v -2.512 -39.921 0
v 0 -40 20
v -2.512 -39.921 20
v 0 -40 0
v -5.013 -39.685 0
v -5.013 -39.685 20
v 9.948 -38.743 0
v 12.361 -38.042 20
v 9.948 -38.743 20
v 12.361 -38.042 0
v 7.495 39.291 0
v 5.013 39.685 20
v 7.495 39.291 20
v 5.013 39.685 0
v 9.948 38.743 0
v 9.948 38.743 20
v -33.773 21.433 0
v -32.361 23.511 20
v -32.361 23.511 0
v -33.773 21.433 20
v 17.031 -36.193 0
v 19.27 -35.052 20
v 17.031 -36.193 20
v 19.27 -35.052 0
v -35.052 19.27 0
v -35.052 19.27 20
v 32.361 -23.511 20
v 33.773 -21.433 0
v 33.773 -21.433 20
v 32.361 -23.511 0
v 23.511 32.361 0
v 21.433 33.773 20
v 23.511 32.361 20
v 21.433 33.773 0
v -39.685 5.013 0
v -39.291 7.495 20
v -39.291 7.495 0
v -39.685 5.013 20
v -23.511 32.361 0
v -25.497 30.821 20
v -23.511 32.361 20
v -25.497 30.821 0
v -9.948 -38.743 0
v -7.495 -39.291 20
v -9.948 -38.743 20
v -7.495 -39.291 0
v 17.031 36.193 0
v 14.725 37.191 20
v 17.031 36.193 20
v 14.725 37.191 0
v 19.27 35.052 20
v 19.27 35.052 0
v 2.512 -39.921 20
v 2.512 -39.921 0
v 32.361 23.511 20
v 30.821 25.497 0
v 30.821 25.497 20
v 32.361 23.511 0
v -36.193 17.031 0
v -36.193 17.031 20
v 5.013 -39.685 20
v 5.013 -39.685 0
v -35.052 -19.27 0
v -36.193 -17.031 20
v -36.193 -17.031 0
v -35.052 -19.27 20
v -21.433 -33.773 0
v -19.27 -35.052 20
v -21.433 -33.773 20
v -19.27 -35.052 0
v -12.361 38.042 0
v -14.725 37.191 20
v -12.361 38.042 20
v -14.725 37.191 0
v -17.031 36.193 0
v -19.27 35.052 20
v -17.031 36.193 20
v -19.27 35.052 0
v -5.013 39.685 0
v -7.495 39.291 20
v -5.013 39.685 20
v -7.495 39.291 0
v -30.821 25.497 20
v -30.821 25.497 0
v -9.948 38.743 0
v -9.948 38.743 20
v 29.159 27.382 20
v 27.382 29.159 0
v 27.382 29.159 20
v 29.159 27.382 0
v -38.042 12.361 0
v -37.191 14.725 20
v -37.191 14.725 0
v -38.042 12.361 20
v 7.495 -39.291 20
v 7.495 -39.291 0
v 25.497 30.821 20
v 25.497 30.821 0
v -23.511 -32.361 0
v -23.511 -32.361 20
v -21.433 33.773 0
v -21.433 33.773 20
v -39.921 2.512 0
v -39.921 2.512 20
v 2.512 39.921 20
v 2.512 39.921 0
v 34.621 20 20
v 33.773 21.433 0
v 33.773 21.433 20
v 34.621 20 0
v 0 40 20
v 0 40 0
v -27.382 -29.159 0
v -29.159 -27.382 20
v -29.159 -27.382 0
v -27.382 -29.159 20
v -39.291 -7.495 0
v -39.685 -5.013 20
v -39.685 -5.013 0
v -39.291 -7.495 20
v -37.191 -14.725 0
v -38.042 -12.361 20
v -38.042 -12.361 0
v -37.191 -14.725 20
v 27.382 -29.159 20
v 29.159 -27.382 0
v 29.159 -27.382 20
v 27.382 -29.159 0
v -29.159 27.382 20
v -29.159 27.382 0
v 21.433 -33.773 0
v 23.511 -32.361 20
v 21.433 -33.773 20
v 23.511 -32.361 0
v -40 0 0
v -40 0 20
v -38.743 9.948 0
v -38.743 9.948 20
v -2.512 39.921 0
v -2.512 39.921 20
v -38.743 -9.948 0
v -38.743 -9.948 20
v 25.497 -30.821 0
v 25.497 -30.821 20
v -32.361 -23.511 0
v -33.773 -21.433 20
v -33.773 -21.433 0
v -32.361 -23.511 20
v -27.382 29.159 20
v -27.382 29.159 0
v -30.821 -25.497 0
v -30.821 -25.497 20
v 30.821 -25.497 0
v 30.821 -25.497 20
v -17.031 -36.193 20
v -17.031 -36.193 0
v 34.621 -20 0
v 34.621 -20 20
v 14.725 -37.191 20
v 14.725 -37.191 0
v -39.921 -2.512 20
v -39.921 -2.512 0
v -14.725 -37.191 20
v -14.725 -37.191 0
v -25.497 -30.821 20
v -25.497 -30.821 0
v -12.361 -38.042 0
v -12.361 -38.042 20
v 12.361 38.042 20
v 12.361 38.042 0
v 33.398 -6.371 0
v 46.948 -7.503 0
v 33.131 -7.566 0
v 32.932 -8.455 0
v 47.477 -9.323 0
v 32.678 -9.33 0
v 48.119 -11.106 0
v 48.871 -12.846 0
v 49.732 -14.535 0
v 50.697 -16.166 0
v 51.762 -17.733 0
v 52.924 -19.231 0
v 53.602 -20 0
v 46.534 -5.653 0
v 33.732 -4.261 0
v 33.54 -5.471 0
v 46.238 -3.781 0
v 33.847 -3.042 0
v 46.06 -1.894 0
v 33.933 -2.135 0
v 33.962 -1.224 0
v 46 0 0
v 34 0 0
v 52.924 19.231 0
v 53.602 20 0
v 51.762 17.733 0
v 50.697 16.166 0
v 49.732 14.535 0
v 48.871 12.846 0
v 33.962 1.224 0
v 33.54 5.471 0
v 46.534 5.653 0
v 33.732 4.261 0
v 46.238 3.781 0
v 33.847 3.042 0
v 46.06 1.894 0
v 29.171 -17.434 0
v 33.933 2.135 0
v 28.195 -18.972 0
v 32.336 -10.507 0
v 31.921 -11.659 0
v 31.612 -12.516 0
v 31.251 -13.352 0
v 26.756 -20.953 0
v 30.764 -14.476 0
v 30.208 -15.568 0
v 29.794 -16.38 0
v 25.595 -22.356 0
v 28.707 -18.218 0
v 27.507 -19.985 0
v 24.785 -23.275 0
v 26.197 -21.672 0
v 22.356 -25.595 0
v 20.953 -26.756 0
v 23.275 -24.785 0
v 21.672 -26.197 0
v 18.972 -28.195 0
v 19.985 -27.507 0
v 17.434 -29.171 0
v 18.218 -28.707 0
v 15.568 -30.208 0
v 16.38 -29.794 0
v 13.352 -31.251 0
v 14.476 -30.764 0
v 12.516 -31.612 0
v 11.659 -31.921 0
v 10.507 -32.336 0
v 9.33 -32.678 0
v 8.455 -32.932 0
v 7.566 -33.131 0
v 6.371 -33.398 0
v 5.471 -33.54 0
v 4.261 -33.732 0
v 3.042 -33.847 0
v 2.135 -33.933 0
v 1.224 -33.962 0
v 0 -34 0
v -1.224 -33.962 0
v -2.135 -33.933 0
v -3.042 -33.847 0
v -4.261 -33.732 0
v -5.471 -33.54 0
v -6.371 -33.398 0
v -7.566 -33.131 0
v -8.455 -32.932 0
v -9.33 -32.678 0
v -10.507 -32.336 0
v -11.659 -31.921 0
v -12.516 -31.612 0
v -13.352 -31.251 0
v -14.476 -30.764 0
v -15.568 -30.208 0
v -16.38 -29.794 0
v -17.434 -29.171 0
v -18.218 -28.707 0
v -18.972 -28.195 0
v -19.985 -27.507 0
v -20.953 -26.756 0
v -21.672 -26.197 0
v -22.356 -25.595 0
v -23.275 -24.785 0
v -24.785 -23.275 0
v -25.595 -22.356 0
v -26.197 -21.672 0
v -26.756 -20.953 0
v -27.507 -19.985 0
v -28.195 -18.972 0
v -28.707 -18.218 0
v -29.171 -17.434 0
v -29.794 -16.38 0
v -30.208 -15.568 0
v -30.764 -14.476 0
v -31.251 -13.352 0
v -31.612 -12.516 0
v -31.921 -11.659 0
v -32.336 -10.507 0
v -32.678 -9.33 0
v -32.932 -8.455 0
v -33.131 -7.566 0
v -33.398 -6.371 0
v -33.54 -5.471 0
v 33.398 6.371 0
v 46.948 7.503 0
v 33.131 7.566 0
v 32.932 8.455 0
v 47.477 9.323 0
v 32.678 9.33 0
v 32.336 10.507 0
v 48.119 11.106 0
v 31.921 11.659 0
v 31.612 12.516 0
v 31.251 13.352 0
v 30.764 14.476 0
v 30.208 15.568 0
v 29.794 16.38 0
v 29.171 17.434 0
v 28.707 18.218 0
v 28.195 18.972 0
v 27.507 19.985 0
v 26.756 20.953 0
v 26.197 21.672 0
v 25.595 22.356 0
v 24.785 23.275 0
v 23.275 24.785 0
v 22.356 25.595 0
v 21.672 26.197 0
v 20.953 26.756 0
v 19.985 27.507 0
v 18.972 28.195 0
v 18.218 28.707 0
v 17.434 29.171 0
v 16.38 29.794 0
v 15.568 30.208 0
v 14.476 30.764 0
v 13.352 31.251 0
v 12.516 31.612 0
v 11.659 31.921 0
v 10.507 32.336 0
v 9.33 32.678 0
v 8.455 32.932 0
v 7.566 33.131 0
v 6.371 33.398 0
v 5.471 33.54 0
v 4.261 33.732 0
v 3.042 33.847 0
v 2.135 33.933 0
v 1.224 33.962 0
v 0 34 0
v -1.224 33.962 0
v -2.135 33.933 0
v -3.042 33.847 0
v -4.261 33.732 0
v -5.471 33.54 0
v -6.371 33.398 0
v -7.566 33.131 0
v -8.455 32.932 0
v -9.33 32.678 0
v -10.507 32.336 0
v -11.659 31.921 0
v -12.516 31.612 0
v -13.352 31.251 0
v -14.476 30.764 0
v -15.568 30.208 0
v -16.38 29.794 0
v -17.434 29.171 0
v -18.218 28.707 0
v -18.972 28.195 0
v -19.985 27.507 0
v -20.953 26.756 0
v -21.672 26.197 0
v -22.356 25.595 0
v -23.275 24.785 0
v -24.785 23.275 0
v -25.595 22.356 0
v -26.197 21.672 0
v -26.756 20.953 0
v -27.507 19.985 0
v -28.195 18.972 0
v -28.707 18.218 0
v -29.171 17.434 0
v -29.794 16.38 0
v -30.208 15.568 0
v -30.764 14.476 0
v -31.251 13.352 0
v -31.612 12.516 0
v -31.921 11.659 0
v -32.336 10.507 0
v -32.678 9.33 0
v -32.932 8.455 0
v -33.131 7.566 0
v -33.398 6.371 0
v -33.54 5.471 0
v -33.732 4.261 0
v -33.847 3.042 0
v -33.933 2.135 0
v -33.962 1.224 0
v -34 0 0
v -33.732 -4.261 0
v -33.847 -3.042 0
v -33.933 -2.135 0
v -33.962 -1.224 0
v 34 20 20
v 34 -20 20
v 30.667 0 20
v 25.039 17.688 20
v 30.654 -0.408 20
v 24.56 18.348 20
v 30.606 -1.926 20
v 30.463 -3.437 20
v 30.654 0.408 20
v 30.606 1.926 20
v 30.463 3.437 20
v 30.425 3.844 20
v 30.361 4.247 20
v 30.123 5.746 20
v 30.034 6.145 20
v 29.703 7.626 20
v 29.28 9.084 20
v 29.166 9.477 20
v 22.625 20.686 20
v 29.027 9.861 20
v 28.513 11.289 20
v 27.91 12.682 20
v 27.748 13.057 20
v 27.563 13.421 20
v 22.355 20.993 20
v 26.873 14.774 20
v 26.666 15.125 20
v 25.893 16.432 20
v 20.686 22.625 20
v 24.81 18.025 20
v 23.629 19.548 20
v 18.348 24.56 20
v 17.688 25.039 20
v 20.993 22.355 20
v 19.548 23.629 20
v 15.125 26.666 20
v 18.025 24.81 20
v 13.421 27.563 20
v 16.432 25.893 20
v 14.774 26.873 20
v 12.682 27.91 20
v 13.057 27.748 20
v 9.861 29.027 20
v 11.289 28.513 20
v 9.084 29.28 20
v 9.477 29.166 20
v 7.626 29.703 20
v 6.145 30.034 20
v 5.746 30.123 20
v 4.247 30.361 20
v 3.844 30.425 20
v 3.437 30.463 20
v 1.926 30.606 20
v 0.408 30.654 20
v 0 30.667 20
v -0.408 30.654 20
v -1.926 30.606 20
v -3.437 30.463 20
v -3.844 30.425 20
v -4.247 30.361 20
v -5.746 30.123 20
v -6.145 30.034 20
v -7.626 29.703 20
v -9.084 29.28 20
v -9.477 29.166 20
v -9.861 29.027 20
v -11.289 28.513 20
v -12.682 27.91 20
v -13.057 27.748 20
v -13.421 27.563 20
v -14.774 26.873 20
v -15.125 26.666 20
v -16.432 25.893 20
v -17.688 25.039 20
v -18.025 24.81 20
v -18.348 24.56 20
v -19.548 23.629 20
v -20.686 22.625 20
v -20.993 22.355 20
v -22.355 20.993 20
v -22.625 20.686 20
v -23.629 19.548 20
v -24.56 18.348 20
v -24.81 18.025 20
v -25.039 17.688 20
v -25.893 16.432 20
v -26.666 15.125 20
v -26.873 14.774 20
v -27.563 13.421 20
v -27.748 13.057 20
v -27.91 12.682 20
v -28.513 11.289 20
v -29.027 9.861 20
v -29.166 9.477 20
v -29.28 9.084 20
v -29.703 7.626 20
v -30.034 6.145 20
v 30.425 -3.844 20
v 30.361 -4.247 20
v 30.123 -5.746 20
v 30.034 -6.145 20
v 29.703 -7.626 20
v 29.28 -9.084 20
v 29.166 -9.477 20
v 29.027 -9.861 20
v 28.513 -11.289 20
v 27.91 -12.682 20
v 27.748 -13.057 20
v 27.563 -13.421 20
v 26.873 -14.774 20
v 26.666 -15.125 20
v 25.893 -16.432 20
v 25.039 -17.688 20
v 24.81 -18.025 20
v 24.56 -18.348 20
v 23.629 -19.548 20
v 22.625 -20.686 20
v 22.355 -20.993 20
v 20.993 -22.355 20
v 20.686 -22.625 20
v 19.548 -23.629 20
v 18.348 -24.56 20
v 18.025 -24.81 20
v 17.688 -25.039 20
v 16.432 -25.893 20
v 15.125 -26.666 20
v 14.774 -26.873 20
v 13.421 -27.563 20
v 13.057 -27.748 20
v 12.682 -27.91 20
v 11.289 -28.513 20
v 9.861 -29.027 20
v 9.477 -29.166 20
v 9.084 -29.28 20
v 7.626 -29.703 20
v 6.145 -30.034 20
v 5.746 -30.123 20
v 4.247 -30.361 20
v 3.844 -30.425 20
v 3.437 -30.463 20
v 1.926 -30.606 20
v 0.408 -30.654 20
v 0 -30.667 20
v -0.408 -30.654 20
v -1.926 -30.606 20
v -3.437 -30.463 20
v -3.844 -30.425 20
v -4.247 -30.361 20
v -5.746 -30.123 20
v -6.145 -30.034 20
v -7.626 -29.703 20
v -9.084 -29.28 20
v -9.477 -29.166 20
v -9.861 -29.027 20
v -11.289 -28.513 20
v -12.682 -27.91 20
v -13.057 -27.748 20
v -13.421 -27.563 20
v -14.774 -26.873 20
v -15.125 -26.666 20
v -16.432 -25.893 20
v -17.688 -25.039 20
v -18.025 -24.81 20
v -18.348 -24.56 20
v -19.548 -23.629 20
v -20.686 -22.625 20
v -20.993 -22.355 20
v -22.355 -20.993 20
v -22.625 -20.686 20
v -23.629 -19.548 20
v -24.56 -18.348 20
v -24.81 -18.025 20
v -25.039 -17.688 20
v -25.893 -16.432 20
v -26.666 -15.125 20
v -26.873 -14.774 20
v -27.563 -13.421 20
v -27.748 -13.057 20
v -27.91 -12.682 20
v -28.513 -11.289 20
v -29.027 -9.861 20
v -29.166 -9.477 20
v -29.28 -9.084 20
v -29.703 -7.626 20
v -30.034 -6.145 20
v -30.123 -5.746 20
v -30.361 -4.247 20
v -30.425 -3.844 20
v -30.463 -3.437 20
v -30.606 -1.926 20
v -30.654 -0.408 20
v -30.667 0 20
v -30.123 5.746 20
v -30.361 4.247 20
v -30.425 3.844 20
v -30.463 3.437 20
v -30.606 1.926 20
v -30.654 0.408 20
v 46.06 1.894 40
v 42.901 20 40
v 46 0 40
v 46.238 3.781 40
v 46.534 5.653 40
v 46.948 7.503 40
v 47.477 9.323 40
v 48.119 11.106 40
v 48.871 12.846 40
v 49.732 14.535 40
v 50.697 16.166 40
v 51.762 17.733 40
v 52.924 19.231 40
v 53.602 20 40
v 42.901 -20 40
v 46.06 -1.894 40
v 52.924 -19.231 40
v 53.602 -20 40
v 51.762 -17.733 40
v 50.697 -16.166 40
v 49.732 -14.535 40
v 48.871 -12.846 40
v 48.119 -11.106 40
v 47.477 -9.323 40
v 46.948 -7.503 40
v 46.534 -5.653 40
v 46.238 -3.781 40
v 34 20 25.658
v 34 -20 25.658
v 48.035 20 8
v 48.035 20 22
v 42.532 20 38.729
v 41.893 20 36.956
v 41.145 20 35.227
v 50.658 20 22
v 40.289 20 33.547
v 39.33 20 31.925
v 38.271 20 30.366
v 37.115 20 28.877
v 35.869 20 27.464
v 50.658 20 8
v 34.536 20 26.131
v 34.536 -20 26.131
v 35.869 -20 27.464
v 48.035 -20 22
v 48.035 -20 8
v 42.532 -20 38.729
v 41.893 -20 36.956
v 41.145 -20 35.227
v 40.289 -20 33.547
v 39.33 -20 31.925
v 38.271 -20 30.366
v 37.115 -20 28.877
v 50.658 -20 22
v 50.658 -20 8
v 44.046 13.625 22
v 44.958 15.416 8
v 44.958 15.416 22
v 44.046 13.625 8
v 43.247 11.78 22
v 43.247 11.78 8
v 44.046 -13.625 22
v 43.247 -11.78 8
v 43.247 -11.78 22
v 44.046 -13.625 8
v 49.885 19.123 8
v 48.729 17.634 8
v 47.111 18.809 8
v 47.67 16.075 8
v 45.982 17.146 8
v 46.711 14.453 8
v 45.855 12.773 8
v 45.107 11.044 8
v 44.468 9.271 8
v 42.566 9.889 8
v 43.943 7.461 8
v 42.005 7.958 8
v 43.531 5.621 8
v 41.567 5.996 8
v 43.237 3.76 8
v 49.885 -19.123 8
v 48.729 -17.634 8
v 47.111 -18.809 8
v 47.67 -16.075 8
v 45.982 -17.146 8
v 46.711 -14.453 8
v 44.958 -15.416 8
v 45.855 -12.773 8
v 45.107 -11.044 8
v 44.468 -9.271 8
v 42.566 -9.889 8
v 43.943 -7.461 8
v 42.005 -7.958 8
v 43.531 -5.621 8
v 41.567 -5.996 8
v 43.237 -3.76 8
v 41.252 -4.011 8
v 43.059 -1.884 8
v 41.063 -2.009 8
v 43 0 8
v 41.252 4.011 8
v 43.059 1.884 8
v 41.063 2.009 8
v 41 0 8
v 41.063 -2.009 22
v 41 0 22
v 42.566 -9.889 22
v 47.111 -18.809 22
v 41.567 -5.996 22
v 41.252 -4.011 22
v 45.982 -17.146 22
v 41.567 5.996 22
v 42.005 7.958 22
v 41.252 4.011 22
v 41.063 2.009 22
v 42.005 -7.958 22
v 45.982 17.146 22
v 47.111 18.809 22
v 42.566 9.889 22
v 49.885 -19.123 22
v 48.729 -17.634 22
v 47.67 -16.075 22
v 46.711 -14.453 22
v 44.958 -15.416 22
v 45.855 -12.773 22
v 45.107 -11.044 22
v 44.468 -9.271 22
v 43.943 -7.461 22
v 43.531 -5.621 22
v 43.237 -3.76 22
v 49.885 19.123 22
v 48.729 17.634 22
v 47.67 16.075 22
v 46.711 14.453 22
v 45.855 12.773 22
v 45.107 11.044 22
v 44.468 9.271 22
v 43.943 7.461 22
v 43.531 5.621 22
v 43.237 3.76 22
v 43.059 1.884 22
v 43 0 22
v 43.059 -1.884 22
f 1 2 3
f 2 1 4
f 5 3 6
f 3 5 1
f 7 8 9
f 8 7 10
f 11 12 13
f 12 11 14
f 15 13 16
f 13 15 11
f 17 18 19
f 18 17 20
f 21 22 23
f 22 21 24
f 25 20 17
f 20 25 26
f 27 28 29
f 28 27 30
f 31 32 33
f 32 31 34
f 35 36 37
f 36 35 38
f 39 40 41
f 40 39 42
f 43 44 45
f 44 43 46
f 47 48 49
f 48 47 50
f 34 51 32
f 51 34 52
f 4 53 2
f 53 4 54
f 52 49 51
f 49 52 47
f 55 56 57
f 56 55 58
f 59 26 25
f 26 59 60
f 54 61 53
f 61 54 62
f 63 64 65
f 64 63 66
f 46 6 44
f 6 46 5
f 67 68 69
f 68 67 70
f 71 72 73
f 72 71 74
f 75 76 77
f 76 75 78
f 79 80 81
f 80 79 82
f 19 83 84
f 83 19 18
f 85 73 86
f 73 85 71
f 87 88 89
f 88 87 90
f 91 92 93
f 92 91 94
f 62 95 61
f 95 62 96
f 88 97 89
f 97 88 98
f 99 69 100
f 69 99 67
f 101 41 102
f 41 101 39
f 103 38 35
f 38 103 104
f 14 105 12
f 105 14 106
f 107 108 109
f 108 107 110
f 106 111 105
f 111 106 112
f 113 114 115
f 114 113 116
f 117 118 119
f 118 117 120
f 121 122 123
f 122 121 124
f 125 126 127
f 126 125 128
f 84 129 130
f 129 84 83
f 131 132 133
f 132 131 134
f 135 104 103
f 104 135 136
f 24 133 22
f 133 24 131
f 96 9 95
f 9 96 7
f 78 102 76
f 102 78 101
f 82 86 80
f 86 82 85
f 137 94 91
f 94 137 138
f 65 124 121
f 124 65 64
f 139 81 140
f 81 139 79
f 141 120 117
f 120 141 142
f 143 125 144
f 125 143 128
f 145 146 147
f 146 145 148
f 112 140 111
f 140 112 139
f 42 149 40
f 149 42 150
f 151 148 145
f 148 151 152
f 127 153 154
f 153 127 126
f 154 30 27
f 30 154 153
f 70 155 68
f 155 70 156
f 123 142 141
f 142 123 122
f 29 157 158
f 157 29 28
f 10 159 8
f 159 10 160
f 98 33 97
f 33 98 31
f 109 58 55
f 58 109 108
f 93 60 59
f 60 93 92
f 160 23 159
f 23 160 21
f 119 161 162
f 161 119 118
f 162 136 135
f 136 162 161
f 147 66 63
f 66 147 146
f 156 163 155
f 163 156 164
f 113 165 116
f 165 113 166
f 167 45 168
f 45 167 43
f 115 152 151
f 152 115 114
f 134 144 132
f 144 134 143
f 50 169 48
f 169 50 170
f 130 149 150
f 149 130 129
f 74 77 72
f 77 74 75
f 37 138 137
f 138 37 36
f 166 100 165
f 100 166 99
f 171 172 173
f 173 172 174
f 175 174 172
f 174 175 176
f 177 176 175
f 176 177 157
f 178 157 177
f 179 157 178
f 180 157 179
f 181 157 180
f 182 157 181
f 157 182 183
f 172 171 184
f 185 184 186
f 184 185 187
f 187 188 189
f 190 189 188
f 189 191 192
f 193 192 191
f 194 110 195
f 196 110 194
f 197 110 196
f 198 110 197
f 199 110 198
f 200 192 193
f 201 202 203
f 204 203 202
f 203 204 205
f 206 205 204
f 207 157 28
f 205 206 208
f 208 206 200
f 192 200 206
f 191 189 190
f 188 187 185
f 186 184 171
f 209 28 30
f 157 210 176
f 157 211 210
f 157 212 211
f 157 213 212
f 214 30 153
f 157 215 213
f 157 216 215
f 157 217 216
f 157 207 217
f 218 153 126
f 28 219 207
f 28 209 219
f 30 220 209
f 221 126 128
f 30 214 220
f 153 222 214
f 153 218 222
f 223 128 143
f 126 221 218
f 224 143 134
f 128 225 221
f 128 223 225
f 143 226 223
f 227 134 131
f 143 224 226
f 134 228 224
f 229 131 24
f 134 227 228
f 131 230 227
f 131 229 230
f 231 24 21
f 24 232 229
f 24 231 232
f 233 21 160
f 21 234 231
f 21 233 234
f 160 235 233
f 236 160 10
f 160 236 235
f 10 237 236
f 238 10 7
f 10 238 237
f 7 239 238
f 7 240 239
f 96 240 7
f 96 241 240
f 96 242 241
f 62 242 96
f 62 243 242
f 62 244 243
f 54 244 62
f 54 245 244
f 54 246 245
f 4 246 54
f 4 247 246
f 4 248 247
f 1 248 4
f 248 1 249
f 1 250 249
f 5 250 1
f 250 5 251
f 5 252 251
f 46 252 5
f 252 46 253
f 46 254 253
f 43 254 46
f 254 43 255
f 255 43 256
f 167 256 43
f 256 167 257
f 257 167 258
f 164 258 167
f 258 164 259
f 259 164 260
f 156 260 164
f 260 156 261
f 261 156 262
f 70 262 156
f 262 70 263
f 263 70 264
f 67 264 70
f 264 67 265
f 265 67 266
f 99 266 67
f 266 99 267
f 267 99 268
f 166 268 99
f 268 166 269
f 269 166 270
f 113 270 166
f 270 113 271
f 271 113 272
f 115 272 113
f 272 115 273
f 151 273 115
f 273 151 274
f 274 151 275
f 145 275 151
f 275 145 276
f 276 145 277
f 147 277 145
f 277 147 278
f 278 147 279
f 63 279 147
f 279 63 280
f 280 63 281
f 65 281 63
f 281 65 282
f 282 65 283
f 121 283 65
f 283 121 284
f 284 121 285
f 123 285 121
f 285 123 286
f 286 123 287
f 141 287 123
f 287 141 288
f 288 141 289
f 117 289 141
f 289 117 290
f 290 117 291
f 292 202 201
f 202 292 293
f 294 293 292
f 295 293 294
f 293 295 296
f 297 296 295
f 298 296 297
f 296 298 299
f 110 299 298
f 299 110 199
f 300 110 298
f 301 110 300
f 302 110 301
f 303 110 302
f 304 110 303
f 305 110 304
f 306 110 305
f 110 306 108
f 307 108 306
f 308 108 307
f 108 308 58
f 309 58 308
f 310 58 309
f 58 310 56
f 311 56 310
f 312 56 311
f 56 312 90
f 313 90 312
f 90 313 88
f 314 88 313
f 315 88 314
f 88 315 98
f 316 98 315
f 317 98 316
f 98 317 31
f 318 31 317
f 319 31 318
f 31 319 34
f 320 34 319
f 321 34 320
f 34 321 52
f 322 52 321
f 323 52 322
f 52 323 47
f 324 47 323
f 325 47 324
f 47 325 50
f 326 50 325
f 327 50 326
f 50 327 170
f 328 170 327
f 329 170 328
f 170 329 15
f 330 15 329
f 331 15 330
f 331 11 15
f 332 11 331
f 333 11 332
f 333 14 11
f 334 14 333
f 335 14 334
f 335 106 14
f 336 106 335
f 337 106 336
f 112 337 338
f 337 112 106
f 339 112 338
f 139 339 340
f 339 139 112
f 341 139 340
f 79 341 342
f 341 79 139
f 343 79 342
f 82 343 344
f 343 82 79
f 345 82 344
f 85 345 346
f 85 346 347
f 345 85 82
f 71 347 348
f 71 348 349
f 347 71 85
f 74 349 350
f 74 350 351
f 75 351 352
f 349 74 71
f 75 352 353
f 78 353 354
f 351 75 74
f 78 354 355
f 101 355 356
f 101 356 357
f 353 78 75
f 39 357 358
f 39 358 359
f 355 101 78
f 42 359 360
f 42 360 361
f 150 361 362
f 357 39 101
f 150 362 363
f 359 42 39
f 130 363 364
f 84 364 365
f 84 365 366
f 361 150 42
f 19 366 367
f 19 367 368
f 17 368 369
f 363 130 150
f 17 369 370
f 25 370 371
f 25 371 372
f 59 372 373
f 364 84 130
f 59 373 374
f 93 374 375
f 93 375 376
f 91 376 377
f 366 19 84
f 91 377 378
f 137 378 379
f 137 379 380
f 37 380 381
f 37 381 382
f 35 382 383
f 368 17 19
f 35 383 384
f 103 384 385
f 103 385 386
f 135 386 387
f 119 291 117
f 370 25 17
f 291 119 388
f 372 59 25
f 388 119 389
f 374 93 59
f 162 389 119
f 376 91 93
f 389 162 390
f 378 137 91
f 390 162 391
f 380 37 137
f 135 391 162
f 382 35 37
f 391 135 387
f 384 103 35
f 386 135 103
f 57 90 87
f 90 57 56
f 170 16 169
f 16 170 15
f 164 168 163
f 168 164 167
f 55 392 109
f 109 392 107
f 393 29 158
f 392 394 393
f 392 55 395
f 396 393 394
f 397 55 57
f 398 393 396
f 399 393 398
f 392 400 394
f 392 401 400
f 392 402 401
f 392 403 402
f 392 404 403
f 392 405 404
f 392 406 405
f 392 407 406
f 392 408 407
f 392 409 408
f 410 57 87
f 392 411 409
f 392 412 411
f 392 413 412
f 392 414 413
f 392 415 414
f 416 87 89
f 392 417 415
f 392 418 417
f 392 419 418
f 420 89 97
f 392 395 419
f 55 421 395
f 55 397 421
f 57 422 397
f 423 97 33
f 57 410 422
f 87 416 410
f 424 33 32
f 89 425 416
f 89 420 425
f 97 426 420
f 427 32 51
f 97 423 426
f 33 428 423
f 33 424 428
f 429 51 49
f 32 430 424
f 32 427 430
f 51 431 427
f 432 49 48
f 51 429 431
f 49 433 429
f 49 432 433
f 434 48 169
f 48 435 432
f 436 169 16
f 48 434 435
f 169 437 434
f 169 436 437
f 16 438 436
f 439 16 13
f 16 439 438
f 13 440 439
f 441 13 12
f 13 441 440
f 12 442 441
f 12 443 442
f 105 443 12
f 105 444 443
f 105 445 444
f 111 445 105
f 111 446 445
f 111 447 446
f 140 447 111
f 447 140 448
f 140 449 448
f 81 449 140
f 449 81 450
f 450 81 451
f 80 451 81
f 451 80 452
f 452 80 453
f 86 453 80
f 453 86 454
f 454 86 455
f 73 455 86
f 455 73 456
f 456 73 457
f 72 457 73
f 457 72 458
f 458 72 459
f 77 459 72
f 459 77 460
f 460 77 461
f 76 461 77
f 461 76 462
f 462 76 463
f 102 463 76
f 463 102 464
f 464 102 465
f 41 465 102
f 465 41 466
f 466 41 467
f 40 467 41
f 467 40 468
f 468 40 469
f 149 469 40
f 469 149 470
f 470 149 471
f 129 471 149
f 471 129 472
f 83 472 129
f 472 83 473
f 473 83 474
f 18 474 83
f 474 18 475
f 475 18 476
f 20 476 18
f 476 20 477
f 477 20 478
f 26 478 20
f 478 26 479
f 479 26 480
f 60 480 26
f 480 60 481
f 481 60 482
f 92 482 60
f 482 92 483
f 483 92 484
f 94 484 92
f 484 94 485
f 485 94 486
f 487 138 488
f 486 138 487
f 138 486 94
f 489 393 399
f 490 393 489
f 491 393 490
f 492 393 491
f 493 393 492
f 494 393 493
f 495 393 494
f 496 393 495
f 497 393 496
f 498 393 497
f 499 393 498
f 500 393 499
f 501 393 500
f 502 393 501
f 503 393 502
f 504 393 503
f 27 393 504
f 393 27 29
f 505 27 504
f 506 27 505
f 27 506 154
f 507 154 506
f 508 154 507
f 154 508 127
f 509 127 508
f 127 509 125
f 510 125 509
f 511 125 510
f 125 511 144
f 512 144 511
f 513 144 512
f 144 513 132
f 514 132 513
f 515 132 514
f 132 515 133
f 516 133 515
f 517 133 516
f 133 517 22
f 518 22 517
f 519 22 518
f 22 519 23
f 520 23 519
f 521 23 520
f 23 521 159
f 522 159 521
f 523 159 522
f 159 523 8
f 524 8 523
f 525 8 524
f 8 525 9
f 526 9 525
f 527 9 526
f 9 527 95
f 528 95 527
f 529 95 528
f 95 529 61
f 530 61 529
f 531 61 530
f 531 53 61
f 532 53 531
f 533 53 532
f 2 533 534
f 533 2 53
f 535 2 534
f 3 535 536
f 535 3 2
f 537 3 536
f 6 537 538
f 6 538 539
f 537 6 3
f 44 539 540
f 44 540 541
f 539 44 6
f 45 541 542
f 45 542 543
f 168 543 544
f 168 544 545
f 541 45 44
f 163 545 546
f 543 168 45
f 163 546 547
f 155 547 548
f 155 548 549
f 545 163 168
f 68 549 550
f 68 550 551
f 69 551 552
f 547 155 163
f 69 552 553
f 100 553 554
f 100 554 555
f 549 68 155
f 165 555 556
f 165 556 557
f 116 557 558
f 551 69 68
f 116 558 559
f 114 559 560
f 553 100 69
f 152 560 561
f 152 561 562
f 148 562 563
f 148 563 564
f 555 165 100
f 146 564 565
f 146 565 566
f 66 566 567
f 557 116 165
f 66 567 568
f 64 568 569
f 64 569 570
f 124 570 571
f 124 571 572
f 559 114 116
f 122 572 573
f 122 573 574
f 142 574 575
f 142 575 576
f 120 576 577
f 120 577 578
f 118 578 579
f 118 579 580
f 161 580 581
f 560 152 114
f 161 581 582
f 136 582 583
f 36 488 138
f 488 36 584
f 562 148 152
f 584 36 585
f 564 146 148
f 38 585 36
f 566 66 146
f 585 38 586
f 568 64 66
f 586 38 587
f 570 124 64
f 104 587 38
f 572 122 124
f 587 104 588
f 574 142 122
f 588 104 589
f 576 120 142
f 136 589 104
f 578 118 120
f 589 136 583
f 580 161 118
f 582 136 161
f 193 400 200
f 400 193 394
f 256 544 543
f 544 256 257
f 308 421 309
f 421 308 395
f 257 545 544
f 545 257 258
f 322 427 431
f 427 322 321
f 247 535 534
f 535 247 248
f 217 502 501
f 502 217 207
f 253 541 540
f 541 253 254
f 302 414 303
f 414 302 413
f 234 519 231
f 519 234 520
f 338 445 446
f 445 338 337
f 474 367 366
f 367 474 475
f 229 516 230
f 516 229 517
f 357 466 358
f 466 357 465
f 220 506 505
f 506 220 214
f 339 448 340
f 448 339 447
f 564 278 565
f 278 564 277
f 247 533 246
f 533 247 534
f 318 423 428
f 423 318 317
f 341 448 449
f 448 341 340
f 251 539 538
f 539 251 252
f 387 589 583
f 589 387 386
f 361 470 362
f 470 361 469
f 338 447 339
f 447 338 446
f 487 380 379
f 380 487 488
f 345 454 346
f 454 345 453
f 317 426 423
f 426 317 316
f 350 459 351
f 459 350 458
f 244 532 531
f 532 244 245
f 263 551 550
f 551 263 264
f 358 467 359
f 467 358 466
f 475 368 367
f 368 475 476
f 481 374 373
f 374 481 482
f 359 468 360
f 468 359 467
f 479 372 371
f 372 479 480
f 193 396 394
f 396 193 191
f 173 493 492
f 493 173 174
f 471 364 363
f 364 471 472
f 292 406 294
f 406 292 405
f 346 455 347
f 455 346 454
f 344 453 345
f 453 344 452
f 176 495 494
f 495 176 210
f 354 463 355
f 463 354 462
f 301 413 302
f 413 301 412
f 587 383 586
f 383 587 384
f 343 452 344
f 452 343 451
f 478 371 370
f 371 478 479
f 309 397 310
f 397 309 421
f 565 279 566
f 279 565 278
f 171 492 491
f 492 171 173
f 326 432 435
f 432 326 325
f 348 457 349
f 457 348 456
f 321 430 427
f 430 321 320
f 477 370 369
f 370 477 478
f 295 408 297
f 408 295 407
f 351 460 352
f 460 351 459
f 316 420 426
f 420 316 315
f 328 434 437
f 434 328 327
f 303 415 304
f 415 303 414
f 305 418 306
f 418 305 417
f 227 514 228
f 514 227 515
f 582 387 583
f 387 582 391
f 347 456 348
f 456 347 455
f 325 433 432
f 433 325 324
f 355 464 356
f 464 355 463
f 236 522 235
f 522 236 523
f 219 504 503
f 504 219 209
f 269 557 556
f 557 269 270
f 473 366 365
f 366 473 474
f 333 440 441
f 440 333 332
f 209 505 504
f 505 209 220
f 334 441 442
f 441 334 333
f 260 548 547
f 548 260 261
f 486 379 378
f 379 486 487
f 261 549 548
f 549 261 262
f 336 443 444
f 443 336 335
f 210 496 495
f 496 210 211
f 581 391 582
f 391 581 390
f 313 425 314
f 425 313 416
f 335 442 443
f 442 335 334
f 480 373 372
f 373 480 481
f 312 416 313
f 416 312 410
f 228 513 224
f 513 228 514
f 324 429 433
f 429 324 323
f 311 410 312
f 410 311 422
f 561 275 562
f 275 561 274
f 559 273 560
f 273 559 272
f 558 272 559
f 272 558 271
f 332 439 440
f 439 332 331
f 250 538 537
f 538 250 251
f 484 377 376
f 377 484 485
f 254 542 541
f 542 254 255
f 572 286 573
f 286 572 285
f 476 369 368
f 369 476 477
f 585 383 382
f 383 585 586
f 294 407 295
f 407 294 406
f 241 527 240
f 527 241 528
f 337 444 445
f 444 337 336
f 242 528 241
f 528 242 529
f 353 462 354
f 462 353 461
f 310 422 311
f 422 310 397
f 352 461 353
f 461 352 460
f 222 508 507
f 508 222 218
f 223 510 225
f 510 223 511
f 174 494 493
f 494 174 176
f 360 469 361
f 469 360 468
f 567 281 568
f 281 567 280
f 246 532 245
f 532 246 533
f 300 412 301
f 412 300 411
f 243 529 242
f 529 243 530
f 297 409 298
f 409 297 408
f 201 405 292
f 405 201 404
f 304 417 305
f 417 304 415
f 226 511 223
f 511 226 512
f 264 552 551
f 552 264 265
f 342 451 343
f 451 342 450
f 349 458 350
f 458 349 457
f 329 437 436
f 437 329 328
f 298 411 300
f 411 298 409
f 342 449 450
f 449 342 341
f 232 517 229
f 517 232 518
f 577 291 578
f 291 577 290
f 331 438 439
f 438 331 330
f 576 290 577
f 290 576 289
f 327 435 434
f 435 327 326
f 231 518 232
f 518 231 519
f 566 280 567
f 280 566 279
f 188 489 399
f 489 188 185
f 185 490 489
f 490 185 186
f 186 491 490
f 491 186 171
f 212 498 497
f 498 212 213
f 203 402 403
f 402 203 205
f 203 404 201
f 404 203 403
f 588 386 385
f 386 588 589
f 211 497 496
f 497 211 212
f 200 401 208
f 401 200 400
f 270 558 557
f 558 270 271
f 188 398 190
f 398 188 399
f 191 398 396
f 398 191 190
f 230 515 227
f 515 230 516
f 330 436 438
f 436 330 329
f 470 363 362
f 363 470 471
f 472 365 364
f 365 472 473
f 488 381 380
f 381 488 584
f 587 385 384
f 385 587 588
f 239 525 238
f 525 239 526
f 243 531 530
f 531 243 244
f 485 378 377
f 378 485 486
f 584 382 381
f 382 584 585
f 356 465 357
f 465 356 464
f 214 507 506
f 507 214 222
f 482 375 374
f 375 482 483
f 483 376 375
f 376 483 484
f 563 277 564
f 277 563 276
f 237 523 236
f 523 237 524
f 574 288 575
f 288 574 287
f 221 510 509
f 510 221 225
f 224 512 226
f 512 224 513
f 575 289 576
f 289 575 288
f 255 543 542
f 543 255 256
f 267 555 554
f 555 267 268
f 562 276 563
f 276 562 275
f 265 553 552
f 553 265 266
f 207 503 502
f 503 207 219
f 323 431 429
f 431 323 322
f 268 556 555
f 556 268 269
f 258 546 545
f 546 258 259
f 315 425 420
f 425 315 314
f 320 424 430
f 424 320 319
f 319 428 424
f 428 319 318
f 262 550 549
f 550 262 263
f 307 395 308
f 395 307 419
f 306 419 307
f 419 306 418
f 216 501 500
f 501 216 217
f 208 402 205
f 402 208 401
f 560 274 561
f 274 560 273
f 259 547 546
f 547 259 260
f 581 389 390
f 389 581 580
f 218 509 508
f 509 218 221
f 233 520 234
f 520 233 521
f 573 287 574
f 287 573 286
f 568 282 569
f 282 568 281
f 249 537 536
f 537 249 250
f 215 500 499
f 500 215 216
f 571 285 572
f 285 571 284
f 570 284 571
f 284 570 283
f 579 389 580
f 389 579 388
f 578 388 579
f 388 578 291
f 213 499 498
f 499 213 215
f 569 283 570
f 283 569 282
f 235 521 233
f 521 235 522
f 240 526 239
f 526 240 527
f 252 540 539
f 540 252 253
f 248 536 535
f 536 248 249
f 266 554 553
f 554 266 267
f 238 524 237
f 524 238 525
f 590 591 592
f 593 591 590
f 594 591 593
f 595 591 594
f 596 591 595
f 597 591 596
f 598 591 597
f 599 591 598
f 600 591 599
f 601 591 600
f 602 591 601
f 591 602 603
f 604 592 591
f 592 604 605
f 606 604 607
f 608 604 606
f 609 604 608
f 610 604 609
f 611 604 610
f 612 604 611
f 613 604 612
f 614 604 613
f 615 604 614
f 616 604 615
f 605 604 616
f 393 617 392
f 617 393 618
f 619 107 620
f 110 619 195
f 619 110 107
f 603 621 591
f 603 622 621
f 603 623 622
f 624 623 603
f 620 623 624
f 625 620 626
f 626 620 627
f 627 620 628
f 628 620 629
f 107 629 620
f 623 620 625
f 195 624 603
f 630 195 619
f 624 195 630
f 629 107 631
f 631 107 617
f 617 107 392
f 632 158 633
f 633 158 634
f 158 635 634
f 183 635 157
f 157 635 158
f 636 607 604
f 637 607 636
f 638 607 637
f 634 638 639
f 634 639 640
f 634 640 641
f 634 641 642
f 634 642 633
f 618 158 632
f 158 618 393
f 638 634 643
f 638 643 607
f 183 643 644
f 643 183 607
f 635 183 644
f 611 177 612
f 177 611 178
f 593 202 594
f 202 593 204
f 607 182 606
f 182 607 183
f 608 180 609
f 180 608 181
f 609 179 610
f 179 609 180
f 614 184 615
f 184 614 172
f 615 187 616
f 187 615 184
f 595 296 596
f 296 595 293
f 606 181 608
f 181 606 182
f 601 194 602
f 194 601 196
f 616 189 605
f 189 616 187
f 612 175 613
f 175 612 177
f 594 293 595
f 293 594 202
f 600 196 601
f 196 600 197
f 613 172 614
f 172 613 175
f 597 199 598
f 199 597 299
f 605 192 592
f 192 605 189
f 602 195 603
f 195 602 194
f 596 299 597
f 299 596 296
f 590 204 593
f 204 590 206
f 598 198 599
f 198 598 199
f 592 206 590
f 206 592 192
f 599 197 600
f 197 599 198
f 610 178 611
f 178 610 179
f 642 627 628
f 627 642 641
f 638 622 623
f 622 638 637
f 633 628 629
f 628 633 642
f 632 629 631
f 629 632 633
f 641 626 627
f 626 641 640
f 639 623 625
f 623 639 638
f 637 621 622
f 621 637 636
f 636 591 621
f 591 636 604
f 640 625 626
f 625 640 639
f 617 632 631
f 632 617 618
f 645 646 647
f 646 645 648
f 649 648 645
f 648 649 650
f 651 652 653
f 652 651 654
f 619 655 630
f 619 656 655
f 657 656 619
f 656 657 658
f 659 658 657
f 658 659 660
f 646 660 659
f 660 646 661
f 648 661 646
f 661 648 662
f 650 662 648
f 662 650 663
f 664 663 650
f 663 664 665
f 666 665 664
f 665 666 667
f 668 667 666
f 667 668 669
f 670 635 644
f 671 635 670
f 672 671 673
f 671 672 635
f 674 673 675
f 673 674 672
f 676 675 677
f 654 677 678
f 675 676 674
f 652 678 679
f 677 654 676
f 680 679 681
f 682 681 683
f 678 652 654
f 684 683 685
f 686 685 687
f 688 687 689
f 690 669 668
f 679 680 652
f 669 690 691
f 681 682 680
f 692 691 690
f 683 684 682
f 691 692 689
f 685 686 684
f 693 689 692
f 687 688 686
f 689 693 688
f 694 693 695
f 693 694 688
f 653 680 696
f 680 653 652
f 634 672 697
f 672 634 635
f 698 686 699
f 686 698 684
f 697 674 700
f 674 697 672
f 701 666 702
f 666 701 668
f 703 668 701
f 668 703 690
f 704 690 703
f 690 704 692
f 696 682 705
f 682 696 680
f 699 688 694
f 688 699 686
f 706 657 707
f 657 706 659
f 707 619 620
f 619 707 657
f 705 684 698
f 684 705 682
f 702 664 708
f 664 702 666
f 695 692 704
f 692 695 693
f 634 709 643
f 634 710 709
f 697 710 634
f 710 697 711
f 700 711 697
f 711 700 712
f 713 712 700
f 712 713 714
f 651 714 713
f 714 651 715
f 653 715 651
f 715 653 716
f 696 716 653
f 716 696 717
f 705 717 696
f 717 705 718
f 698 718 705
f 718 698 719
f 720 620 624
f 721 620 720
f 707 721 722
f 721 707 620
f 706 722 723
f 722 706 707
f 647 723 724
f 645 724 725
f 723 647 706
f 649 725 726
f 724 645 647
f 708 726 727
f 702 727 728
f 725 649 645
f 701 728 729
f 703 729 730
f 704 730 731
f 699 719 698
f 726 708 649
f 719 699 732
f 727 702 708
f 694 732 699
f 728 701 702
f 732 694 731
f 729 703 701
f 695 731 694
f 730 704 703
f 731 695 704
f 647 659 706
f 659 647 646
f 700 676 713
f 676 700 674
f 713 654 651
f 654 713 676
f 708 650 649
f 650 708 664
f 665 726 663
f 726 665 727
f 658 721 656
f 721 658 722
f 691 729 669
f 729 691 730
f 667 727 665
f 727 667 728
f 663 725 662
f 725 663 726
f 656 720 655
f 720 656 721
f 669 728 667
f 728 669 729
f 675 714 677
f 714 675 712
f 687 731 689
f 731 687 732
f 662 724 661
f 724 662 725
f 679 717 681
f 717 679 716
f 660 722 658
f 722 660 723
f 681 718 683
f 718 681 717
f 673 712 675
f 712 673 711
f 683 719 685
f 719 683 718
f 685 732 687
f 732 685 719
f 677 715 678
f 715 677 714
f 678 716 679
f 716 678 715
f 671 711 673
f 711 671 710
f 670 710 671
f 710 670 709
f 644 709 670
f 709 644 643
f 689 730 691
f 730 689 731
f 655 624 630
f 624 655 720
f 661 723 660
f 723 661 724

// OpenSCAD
/* NOTES:
	writecylinder(text="text",where=[0,0,0],radius=20,height=40);
	
	Required Parameters (If supplied in this order, identifier is not required)
		text="text"	 	: Text to be written
		where=[x,y,z]	: coordinates of cylinder
		radius=mm 		: radius of cylinder
		height=mm 		: height of cylinder

	Optional Parameter:
		center=boolean :	use this to specify that cylinder is centered on coordinates
					(default is center=false)
		face="top" : Top of cylinder
		face="bottom": bottom of cylinder
		face="front" :barrel of cylinder (default if not supplied)	

	Optional Parameters: (face is not "top" or "bottom")
		east=degrees : west= degrees: (moves text east or west around z)
		up=mm or down=mm : moves text up or down along Z axis
		rotate=degrees : rotates text around Y axis (spirals around cylinder)
	
	Optional Parameters: (face="top" or face="bottom")
		east=degrees or west=degrees : rotate text east or west around top
		rotate=degrees : (similar to east west but not dependant on text orientation)
		ccw=boolean : If true, writes in a counter clockwise direction. (default=false)
		middle=mm :moves the text ?mm toward center of top or bottom surface 	

*/

use <WriteSVG.scad>


 //-- Parmetros del vaso
/* grosor = 20;
 diam_ext=80;
 diam_int = 63.3; 
 texto = "Claudia";
diam_tubo = 60;
*/

// Aro
module aro(grosor_aro=20,  diam_ext=80, diam_int = 63.3, texto = "Claudia")
{
 // Exterior Aro
 difference(){
  difference() {
     //-- Base de la rueda
    cylinder(r=diam_ext/2,h=grosor_aro,  $fn=100);
	rotate([0,180,-90])
	translate([0,0,-20])
    	writecylinder(texto,[0,0,0],diam_ext/2-0.7,grosor_aro);
   } 

    //-- Taladro aro
   cylinder(r1=diam_int/2+5, r2=diam_int/2-5,h=grosor_aro*3,$fn=100,center=true);
 }
}

//Base asa
module base_asa(altura=40, diam_int = 63.3, diam_ext=80, diam_tubo = 60)
{
difference(){
difference(){
 translate([diam_int/2,-20,0])
 cube([30,40,altura]);

translate([(diam_ext+diam_tubo)/2+6,0,altura/2])
  cylinder(r=diam_tubo/2, h=altura*2,$fn=100,center=true);
}

translate([14,21,48])
rotate([90,0,0])
cylinder(r=60/2,h=42,  $fn=100);
}
}

//Cuerpdel soporte del vaso
module cuerpo_sv(grosor_aro=20,  diam_ext=80, diam_int = 68, texto = "Claudia",altura=40, diam_tubo = 60.34){
 aro(grosor_aro,  diam_ext, diam_int, texto);
 base_asa(altura, diam_int, diam_ext, diam_tubo);
}

module agarradera( diam_ext=80, diam_int = 63.3, altura_ag=12, ancho_ag=2, diam_tubo = 60){
difference(){
  	translate([(diam_ext+diam_tubo)/2+3,0,0])
	cylinder(r=diam_tubo/2+ancho_ag, h=altura_ag,$fn=100);

  	translate([(diam_ext+diam_tubo)/2+3,0,-altura_ag*2])
	cylinder(r=diam_tubo/2, h=altura_ag*4,$fn=100);
}
}

module agarraderas( altura_asa=40, diam_ext=80, diam_int = 63.3, altura_ag=14, ancho_ag=2, diam_tubo = 60){
separacion=(altura_asa-altura_ag*2)/3;
translate([0,0,separacion*2])
agarradera(diam_ext, diam_int , altura_ag, ancho_ag, diam_tubo );

// Una agarradera es suficiente. La de más abajo no es necesaria
/*translate([0,0,separacion*2+altura_ag])
agarradera(diam_ext, diam_int , altura_ag, ancho_ag, diam_tubo );
*/
}

module soporte_vaso(){
	difference(){	
		cuerpo_sv();
		agarraderas();
	}
}
/*difference(){	
soporte_vaso();
color("Red")
translate([14,21,48])
rotate([90,0,0])
cylinder(r=60/2,h=42,  $fn=100);
}*/

soporte_vaso();
